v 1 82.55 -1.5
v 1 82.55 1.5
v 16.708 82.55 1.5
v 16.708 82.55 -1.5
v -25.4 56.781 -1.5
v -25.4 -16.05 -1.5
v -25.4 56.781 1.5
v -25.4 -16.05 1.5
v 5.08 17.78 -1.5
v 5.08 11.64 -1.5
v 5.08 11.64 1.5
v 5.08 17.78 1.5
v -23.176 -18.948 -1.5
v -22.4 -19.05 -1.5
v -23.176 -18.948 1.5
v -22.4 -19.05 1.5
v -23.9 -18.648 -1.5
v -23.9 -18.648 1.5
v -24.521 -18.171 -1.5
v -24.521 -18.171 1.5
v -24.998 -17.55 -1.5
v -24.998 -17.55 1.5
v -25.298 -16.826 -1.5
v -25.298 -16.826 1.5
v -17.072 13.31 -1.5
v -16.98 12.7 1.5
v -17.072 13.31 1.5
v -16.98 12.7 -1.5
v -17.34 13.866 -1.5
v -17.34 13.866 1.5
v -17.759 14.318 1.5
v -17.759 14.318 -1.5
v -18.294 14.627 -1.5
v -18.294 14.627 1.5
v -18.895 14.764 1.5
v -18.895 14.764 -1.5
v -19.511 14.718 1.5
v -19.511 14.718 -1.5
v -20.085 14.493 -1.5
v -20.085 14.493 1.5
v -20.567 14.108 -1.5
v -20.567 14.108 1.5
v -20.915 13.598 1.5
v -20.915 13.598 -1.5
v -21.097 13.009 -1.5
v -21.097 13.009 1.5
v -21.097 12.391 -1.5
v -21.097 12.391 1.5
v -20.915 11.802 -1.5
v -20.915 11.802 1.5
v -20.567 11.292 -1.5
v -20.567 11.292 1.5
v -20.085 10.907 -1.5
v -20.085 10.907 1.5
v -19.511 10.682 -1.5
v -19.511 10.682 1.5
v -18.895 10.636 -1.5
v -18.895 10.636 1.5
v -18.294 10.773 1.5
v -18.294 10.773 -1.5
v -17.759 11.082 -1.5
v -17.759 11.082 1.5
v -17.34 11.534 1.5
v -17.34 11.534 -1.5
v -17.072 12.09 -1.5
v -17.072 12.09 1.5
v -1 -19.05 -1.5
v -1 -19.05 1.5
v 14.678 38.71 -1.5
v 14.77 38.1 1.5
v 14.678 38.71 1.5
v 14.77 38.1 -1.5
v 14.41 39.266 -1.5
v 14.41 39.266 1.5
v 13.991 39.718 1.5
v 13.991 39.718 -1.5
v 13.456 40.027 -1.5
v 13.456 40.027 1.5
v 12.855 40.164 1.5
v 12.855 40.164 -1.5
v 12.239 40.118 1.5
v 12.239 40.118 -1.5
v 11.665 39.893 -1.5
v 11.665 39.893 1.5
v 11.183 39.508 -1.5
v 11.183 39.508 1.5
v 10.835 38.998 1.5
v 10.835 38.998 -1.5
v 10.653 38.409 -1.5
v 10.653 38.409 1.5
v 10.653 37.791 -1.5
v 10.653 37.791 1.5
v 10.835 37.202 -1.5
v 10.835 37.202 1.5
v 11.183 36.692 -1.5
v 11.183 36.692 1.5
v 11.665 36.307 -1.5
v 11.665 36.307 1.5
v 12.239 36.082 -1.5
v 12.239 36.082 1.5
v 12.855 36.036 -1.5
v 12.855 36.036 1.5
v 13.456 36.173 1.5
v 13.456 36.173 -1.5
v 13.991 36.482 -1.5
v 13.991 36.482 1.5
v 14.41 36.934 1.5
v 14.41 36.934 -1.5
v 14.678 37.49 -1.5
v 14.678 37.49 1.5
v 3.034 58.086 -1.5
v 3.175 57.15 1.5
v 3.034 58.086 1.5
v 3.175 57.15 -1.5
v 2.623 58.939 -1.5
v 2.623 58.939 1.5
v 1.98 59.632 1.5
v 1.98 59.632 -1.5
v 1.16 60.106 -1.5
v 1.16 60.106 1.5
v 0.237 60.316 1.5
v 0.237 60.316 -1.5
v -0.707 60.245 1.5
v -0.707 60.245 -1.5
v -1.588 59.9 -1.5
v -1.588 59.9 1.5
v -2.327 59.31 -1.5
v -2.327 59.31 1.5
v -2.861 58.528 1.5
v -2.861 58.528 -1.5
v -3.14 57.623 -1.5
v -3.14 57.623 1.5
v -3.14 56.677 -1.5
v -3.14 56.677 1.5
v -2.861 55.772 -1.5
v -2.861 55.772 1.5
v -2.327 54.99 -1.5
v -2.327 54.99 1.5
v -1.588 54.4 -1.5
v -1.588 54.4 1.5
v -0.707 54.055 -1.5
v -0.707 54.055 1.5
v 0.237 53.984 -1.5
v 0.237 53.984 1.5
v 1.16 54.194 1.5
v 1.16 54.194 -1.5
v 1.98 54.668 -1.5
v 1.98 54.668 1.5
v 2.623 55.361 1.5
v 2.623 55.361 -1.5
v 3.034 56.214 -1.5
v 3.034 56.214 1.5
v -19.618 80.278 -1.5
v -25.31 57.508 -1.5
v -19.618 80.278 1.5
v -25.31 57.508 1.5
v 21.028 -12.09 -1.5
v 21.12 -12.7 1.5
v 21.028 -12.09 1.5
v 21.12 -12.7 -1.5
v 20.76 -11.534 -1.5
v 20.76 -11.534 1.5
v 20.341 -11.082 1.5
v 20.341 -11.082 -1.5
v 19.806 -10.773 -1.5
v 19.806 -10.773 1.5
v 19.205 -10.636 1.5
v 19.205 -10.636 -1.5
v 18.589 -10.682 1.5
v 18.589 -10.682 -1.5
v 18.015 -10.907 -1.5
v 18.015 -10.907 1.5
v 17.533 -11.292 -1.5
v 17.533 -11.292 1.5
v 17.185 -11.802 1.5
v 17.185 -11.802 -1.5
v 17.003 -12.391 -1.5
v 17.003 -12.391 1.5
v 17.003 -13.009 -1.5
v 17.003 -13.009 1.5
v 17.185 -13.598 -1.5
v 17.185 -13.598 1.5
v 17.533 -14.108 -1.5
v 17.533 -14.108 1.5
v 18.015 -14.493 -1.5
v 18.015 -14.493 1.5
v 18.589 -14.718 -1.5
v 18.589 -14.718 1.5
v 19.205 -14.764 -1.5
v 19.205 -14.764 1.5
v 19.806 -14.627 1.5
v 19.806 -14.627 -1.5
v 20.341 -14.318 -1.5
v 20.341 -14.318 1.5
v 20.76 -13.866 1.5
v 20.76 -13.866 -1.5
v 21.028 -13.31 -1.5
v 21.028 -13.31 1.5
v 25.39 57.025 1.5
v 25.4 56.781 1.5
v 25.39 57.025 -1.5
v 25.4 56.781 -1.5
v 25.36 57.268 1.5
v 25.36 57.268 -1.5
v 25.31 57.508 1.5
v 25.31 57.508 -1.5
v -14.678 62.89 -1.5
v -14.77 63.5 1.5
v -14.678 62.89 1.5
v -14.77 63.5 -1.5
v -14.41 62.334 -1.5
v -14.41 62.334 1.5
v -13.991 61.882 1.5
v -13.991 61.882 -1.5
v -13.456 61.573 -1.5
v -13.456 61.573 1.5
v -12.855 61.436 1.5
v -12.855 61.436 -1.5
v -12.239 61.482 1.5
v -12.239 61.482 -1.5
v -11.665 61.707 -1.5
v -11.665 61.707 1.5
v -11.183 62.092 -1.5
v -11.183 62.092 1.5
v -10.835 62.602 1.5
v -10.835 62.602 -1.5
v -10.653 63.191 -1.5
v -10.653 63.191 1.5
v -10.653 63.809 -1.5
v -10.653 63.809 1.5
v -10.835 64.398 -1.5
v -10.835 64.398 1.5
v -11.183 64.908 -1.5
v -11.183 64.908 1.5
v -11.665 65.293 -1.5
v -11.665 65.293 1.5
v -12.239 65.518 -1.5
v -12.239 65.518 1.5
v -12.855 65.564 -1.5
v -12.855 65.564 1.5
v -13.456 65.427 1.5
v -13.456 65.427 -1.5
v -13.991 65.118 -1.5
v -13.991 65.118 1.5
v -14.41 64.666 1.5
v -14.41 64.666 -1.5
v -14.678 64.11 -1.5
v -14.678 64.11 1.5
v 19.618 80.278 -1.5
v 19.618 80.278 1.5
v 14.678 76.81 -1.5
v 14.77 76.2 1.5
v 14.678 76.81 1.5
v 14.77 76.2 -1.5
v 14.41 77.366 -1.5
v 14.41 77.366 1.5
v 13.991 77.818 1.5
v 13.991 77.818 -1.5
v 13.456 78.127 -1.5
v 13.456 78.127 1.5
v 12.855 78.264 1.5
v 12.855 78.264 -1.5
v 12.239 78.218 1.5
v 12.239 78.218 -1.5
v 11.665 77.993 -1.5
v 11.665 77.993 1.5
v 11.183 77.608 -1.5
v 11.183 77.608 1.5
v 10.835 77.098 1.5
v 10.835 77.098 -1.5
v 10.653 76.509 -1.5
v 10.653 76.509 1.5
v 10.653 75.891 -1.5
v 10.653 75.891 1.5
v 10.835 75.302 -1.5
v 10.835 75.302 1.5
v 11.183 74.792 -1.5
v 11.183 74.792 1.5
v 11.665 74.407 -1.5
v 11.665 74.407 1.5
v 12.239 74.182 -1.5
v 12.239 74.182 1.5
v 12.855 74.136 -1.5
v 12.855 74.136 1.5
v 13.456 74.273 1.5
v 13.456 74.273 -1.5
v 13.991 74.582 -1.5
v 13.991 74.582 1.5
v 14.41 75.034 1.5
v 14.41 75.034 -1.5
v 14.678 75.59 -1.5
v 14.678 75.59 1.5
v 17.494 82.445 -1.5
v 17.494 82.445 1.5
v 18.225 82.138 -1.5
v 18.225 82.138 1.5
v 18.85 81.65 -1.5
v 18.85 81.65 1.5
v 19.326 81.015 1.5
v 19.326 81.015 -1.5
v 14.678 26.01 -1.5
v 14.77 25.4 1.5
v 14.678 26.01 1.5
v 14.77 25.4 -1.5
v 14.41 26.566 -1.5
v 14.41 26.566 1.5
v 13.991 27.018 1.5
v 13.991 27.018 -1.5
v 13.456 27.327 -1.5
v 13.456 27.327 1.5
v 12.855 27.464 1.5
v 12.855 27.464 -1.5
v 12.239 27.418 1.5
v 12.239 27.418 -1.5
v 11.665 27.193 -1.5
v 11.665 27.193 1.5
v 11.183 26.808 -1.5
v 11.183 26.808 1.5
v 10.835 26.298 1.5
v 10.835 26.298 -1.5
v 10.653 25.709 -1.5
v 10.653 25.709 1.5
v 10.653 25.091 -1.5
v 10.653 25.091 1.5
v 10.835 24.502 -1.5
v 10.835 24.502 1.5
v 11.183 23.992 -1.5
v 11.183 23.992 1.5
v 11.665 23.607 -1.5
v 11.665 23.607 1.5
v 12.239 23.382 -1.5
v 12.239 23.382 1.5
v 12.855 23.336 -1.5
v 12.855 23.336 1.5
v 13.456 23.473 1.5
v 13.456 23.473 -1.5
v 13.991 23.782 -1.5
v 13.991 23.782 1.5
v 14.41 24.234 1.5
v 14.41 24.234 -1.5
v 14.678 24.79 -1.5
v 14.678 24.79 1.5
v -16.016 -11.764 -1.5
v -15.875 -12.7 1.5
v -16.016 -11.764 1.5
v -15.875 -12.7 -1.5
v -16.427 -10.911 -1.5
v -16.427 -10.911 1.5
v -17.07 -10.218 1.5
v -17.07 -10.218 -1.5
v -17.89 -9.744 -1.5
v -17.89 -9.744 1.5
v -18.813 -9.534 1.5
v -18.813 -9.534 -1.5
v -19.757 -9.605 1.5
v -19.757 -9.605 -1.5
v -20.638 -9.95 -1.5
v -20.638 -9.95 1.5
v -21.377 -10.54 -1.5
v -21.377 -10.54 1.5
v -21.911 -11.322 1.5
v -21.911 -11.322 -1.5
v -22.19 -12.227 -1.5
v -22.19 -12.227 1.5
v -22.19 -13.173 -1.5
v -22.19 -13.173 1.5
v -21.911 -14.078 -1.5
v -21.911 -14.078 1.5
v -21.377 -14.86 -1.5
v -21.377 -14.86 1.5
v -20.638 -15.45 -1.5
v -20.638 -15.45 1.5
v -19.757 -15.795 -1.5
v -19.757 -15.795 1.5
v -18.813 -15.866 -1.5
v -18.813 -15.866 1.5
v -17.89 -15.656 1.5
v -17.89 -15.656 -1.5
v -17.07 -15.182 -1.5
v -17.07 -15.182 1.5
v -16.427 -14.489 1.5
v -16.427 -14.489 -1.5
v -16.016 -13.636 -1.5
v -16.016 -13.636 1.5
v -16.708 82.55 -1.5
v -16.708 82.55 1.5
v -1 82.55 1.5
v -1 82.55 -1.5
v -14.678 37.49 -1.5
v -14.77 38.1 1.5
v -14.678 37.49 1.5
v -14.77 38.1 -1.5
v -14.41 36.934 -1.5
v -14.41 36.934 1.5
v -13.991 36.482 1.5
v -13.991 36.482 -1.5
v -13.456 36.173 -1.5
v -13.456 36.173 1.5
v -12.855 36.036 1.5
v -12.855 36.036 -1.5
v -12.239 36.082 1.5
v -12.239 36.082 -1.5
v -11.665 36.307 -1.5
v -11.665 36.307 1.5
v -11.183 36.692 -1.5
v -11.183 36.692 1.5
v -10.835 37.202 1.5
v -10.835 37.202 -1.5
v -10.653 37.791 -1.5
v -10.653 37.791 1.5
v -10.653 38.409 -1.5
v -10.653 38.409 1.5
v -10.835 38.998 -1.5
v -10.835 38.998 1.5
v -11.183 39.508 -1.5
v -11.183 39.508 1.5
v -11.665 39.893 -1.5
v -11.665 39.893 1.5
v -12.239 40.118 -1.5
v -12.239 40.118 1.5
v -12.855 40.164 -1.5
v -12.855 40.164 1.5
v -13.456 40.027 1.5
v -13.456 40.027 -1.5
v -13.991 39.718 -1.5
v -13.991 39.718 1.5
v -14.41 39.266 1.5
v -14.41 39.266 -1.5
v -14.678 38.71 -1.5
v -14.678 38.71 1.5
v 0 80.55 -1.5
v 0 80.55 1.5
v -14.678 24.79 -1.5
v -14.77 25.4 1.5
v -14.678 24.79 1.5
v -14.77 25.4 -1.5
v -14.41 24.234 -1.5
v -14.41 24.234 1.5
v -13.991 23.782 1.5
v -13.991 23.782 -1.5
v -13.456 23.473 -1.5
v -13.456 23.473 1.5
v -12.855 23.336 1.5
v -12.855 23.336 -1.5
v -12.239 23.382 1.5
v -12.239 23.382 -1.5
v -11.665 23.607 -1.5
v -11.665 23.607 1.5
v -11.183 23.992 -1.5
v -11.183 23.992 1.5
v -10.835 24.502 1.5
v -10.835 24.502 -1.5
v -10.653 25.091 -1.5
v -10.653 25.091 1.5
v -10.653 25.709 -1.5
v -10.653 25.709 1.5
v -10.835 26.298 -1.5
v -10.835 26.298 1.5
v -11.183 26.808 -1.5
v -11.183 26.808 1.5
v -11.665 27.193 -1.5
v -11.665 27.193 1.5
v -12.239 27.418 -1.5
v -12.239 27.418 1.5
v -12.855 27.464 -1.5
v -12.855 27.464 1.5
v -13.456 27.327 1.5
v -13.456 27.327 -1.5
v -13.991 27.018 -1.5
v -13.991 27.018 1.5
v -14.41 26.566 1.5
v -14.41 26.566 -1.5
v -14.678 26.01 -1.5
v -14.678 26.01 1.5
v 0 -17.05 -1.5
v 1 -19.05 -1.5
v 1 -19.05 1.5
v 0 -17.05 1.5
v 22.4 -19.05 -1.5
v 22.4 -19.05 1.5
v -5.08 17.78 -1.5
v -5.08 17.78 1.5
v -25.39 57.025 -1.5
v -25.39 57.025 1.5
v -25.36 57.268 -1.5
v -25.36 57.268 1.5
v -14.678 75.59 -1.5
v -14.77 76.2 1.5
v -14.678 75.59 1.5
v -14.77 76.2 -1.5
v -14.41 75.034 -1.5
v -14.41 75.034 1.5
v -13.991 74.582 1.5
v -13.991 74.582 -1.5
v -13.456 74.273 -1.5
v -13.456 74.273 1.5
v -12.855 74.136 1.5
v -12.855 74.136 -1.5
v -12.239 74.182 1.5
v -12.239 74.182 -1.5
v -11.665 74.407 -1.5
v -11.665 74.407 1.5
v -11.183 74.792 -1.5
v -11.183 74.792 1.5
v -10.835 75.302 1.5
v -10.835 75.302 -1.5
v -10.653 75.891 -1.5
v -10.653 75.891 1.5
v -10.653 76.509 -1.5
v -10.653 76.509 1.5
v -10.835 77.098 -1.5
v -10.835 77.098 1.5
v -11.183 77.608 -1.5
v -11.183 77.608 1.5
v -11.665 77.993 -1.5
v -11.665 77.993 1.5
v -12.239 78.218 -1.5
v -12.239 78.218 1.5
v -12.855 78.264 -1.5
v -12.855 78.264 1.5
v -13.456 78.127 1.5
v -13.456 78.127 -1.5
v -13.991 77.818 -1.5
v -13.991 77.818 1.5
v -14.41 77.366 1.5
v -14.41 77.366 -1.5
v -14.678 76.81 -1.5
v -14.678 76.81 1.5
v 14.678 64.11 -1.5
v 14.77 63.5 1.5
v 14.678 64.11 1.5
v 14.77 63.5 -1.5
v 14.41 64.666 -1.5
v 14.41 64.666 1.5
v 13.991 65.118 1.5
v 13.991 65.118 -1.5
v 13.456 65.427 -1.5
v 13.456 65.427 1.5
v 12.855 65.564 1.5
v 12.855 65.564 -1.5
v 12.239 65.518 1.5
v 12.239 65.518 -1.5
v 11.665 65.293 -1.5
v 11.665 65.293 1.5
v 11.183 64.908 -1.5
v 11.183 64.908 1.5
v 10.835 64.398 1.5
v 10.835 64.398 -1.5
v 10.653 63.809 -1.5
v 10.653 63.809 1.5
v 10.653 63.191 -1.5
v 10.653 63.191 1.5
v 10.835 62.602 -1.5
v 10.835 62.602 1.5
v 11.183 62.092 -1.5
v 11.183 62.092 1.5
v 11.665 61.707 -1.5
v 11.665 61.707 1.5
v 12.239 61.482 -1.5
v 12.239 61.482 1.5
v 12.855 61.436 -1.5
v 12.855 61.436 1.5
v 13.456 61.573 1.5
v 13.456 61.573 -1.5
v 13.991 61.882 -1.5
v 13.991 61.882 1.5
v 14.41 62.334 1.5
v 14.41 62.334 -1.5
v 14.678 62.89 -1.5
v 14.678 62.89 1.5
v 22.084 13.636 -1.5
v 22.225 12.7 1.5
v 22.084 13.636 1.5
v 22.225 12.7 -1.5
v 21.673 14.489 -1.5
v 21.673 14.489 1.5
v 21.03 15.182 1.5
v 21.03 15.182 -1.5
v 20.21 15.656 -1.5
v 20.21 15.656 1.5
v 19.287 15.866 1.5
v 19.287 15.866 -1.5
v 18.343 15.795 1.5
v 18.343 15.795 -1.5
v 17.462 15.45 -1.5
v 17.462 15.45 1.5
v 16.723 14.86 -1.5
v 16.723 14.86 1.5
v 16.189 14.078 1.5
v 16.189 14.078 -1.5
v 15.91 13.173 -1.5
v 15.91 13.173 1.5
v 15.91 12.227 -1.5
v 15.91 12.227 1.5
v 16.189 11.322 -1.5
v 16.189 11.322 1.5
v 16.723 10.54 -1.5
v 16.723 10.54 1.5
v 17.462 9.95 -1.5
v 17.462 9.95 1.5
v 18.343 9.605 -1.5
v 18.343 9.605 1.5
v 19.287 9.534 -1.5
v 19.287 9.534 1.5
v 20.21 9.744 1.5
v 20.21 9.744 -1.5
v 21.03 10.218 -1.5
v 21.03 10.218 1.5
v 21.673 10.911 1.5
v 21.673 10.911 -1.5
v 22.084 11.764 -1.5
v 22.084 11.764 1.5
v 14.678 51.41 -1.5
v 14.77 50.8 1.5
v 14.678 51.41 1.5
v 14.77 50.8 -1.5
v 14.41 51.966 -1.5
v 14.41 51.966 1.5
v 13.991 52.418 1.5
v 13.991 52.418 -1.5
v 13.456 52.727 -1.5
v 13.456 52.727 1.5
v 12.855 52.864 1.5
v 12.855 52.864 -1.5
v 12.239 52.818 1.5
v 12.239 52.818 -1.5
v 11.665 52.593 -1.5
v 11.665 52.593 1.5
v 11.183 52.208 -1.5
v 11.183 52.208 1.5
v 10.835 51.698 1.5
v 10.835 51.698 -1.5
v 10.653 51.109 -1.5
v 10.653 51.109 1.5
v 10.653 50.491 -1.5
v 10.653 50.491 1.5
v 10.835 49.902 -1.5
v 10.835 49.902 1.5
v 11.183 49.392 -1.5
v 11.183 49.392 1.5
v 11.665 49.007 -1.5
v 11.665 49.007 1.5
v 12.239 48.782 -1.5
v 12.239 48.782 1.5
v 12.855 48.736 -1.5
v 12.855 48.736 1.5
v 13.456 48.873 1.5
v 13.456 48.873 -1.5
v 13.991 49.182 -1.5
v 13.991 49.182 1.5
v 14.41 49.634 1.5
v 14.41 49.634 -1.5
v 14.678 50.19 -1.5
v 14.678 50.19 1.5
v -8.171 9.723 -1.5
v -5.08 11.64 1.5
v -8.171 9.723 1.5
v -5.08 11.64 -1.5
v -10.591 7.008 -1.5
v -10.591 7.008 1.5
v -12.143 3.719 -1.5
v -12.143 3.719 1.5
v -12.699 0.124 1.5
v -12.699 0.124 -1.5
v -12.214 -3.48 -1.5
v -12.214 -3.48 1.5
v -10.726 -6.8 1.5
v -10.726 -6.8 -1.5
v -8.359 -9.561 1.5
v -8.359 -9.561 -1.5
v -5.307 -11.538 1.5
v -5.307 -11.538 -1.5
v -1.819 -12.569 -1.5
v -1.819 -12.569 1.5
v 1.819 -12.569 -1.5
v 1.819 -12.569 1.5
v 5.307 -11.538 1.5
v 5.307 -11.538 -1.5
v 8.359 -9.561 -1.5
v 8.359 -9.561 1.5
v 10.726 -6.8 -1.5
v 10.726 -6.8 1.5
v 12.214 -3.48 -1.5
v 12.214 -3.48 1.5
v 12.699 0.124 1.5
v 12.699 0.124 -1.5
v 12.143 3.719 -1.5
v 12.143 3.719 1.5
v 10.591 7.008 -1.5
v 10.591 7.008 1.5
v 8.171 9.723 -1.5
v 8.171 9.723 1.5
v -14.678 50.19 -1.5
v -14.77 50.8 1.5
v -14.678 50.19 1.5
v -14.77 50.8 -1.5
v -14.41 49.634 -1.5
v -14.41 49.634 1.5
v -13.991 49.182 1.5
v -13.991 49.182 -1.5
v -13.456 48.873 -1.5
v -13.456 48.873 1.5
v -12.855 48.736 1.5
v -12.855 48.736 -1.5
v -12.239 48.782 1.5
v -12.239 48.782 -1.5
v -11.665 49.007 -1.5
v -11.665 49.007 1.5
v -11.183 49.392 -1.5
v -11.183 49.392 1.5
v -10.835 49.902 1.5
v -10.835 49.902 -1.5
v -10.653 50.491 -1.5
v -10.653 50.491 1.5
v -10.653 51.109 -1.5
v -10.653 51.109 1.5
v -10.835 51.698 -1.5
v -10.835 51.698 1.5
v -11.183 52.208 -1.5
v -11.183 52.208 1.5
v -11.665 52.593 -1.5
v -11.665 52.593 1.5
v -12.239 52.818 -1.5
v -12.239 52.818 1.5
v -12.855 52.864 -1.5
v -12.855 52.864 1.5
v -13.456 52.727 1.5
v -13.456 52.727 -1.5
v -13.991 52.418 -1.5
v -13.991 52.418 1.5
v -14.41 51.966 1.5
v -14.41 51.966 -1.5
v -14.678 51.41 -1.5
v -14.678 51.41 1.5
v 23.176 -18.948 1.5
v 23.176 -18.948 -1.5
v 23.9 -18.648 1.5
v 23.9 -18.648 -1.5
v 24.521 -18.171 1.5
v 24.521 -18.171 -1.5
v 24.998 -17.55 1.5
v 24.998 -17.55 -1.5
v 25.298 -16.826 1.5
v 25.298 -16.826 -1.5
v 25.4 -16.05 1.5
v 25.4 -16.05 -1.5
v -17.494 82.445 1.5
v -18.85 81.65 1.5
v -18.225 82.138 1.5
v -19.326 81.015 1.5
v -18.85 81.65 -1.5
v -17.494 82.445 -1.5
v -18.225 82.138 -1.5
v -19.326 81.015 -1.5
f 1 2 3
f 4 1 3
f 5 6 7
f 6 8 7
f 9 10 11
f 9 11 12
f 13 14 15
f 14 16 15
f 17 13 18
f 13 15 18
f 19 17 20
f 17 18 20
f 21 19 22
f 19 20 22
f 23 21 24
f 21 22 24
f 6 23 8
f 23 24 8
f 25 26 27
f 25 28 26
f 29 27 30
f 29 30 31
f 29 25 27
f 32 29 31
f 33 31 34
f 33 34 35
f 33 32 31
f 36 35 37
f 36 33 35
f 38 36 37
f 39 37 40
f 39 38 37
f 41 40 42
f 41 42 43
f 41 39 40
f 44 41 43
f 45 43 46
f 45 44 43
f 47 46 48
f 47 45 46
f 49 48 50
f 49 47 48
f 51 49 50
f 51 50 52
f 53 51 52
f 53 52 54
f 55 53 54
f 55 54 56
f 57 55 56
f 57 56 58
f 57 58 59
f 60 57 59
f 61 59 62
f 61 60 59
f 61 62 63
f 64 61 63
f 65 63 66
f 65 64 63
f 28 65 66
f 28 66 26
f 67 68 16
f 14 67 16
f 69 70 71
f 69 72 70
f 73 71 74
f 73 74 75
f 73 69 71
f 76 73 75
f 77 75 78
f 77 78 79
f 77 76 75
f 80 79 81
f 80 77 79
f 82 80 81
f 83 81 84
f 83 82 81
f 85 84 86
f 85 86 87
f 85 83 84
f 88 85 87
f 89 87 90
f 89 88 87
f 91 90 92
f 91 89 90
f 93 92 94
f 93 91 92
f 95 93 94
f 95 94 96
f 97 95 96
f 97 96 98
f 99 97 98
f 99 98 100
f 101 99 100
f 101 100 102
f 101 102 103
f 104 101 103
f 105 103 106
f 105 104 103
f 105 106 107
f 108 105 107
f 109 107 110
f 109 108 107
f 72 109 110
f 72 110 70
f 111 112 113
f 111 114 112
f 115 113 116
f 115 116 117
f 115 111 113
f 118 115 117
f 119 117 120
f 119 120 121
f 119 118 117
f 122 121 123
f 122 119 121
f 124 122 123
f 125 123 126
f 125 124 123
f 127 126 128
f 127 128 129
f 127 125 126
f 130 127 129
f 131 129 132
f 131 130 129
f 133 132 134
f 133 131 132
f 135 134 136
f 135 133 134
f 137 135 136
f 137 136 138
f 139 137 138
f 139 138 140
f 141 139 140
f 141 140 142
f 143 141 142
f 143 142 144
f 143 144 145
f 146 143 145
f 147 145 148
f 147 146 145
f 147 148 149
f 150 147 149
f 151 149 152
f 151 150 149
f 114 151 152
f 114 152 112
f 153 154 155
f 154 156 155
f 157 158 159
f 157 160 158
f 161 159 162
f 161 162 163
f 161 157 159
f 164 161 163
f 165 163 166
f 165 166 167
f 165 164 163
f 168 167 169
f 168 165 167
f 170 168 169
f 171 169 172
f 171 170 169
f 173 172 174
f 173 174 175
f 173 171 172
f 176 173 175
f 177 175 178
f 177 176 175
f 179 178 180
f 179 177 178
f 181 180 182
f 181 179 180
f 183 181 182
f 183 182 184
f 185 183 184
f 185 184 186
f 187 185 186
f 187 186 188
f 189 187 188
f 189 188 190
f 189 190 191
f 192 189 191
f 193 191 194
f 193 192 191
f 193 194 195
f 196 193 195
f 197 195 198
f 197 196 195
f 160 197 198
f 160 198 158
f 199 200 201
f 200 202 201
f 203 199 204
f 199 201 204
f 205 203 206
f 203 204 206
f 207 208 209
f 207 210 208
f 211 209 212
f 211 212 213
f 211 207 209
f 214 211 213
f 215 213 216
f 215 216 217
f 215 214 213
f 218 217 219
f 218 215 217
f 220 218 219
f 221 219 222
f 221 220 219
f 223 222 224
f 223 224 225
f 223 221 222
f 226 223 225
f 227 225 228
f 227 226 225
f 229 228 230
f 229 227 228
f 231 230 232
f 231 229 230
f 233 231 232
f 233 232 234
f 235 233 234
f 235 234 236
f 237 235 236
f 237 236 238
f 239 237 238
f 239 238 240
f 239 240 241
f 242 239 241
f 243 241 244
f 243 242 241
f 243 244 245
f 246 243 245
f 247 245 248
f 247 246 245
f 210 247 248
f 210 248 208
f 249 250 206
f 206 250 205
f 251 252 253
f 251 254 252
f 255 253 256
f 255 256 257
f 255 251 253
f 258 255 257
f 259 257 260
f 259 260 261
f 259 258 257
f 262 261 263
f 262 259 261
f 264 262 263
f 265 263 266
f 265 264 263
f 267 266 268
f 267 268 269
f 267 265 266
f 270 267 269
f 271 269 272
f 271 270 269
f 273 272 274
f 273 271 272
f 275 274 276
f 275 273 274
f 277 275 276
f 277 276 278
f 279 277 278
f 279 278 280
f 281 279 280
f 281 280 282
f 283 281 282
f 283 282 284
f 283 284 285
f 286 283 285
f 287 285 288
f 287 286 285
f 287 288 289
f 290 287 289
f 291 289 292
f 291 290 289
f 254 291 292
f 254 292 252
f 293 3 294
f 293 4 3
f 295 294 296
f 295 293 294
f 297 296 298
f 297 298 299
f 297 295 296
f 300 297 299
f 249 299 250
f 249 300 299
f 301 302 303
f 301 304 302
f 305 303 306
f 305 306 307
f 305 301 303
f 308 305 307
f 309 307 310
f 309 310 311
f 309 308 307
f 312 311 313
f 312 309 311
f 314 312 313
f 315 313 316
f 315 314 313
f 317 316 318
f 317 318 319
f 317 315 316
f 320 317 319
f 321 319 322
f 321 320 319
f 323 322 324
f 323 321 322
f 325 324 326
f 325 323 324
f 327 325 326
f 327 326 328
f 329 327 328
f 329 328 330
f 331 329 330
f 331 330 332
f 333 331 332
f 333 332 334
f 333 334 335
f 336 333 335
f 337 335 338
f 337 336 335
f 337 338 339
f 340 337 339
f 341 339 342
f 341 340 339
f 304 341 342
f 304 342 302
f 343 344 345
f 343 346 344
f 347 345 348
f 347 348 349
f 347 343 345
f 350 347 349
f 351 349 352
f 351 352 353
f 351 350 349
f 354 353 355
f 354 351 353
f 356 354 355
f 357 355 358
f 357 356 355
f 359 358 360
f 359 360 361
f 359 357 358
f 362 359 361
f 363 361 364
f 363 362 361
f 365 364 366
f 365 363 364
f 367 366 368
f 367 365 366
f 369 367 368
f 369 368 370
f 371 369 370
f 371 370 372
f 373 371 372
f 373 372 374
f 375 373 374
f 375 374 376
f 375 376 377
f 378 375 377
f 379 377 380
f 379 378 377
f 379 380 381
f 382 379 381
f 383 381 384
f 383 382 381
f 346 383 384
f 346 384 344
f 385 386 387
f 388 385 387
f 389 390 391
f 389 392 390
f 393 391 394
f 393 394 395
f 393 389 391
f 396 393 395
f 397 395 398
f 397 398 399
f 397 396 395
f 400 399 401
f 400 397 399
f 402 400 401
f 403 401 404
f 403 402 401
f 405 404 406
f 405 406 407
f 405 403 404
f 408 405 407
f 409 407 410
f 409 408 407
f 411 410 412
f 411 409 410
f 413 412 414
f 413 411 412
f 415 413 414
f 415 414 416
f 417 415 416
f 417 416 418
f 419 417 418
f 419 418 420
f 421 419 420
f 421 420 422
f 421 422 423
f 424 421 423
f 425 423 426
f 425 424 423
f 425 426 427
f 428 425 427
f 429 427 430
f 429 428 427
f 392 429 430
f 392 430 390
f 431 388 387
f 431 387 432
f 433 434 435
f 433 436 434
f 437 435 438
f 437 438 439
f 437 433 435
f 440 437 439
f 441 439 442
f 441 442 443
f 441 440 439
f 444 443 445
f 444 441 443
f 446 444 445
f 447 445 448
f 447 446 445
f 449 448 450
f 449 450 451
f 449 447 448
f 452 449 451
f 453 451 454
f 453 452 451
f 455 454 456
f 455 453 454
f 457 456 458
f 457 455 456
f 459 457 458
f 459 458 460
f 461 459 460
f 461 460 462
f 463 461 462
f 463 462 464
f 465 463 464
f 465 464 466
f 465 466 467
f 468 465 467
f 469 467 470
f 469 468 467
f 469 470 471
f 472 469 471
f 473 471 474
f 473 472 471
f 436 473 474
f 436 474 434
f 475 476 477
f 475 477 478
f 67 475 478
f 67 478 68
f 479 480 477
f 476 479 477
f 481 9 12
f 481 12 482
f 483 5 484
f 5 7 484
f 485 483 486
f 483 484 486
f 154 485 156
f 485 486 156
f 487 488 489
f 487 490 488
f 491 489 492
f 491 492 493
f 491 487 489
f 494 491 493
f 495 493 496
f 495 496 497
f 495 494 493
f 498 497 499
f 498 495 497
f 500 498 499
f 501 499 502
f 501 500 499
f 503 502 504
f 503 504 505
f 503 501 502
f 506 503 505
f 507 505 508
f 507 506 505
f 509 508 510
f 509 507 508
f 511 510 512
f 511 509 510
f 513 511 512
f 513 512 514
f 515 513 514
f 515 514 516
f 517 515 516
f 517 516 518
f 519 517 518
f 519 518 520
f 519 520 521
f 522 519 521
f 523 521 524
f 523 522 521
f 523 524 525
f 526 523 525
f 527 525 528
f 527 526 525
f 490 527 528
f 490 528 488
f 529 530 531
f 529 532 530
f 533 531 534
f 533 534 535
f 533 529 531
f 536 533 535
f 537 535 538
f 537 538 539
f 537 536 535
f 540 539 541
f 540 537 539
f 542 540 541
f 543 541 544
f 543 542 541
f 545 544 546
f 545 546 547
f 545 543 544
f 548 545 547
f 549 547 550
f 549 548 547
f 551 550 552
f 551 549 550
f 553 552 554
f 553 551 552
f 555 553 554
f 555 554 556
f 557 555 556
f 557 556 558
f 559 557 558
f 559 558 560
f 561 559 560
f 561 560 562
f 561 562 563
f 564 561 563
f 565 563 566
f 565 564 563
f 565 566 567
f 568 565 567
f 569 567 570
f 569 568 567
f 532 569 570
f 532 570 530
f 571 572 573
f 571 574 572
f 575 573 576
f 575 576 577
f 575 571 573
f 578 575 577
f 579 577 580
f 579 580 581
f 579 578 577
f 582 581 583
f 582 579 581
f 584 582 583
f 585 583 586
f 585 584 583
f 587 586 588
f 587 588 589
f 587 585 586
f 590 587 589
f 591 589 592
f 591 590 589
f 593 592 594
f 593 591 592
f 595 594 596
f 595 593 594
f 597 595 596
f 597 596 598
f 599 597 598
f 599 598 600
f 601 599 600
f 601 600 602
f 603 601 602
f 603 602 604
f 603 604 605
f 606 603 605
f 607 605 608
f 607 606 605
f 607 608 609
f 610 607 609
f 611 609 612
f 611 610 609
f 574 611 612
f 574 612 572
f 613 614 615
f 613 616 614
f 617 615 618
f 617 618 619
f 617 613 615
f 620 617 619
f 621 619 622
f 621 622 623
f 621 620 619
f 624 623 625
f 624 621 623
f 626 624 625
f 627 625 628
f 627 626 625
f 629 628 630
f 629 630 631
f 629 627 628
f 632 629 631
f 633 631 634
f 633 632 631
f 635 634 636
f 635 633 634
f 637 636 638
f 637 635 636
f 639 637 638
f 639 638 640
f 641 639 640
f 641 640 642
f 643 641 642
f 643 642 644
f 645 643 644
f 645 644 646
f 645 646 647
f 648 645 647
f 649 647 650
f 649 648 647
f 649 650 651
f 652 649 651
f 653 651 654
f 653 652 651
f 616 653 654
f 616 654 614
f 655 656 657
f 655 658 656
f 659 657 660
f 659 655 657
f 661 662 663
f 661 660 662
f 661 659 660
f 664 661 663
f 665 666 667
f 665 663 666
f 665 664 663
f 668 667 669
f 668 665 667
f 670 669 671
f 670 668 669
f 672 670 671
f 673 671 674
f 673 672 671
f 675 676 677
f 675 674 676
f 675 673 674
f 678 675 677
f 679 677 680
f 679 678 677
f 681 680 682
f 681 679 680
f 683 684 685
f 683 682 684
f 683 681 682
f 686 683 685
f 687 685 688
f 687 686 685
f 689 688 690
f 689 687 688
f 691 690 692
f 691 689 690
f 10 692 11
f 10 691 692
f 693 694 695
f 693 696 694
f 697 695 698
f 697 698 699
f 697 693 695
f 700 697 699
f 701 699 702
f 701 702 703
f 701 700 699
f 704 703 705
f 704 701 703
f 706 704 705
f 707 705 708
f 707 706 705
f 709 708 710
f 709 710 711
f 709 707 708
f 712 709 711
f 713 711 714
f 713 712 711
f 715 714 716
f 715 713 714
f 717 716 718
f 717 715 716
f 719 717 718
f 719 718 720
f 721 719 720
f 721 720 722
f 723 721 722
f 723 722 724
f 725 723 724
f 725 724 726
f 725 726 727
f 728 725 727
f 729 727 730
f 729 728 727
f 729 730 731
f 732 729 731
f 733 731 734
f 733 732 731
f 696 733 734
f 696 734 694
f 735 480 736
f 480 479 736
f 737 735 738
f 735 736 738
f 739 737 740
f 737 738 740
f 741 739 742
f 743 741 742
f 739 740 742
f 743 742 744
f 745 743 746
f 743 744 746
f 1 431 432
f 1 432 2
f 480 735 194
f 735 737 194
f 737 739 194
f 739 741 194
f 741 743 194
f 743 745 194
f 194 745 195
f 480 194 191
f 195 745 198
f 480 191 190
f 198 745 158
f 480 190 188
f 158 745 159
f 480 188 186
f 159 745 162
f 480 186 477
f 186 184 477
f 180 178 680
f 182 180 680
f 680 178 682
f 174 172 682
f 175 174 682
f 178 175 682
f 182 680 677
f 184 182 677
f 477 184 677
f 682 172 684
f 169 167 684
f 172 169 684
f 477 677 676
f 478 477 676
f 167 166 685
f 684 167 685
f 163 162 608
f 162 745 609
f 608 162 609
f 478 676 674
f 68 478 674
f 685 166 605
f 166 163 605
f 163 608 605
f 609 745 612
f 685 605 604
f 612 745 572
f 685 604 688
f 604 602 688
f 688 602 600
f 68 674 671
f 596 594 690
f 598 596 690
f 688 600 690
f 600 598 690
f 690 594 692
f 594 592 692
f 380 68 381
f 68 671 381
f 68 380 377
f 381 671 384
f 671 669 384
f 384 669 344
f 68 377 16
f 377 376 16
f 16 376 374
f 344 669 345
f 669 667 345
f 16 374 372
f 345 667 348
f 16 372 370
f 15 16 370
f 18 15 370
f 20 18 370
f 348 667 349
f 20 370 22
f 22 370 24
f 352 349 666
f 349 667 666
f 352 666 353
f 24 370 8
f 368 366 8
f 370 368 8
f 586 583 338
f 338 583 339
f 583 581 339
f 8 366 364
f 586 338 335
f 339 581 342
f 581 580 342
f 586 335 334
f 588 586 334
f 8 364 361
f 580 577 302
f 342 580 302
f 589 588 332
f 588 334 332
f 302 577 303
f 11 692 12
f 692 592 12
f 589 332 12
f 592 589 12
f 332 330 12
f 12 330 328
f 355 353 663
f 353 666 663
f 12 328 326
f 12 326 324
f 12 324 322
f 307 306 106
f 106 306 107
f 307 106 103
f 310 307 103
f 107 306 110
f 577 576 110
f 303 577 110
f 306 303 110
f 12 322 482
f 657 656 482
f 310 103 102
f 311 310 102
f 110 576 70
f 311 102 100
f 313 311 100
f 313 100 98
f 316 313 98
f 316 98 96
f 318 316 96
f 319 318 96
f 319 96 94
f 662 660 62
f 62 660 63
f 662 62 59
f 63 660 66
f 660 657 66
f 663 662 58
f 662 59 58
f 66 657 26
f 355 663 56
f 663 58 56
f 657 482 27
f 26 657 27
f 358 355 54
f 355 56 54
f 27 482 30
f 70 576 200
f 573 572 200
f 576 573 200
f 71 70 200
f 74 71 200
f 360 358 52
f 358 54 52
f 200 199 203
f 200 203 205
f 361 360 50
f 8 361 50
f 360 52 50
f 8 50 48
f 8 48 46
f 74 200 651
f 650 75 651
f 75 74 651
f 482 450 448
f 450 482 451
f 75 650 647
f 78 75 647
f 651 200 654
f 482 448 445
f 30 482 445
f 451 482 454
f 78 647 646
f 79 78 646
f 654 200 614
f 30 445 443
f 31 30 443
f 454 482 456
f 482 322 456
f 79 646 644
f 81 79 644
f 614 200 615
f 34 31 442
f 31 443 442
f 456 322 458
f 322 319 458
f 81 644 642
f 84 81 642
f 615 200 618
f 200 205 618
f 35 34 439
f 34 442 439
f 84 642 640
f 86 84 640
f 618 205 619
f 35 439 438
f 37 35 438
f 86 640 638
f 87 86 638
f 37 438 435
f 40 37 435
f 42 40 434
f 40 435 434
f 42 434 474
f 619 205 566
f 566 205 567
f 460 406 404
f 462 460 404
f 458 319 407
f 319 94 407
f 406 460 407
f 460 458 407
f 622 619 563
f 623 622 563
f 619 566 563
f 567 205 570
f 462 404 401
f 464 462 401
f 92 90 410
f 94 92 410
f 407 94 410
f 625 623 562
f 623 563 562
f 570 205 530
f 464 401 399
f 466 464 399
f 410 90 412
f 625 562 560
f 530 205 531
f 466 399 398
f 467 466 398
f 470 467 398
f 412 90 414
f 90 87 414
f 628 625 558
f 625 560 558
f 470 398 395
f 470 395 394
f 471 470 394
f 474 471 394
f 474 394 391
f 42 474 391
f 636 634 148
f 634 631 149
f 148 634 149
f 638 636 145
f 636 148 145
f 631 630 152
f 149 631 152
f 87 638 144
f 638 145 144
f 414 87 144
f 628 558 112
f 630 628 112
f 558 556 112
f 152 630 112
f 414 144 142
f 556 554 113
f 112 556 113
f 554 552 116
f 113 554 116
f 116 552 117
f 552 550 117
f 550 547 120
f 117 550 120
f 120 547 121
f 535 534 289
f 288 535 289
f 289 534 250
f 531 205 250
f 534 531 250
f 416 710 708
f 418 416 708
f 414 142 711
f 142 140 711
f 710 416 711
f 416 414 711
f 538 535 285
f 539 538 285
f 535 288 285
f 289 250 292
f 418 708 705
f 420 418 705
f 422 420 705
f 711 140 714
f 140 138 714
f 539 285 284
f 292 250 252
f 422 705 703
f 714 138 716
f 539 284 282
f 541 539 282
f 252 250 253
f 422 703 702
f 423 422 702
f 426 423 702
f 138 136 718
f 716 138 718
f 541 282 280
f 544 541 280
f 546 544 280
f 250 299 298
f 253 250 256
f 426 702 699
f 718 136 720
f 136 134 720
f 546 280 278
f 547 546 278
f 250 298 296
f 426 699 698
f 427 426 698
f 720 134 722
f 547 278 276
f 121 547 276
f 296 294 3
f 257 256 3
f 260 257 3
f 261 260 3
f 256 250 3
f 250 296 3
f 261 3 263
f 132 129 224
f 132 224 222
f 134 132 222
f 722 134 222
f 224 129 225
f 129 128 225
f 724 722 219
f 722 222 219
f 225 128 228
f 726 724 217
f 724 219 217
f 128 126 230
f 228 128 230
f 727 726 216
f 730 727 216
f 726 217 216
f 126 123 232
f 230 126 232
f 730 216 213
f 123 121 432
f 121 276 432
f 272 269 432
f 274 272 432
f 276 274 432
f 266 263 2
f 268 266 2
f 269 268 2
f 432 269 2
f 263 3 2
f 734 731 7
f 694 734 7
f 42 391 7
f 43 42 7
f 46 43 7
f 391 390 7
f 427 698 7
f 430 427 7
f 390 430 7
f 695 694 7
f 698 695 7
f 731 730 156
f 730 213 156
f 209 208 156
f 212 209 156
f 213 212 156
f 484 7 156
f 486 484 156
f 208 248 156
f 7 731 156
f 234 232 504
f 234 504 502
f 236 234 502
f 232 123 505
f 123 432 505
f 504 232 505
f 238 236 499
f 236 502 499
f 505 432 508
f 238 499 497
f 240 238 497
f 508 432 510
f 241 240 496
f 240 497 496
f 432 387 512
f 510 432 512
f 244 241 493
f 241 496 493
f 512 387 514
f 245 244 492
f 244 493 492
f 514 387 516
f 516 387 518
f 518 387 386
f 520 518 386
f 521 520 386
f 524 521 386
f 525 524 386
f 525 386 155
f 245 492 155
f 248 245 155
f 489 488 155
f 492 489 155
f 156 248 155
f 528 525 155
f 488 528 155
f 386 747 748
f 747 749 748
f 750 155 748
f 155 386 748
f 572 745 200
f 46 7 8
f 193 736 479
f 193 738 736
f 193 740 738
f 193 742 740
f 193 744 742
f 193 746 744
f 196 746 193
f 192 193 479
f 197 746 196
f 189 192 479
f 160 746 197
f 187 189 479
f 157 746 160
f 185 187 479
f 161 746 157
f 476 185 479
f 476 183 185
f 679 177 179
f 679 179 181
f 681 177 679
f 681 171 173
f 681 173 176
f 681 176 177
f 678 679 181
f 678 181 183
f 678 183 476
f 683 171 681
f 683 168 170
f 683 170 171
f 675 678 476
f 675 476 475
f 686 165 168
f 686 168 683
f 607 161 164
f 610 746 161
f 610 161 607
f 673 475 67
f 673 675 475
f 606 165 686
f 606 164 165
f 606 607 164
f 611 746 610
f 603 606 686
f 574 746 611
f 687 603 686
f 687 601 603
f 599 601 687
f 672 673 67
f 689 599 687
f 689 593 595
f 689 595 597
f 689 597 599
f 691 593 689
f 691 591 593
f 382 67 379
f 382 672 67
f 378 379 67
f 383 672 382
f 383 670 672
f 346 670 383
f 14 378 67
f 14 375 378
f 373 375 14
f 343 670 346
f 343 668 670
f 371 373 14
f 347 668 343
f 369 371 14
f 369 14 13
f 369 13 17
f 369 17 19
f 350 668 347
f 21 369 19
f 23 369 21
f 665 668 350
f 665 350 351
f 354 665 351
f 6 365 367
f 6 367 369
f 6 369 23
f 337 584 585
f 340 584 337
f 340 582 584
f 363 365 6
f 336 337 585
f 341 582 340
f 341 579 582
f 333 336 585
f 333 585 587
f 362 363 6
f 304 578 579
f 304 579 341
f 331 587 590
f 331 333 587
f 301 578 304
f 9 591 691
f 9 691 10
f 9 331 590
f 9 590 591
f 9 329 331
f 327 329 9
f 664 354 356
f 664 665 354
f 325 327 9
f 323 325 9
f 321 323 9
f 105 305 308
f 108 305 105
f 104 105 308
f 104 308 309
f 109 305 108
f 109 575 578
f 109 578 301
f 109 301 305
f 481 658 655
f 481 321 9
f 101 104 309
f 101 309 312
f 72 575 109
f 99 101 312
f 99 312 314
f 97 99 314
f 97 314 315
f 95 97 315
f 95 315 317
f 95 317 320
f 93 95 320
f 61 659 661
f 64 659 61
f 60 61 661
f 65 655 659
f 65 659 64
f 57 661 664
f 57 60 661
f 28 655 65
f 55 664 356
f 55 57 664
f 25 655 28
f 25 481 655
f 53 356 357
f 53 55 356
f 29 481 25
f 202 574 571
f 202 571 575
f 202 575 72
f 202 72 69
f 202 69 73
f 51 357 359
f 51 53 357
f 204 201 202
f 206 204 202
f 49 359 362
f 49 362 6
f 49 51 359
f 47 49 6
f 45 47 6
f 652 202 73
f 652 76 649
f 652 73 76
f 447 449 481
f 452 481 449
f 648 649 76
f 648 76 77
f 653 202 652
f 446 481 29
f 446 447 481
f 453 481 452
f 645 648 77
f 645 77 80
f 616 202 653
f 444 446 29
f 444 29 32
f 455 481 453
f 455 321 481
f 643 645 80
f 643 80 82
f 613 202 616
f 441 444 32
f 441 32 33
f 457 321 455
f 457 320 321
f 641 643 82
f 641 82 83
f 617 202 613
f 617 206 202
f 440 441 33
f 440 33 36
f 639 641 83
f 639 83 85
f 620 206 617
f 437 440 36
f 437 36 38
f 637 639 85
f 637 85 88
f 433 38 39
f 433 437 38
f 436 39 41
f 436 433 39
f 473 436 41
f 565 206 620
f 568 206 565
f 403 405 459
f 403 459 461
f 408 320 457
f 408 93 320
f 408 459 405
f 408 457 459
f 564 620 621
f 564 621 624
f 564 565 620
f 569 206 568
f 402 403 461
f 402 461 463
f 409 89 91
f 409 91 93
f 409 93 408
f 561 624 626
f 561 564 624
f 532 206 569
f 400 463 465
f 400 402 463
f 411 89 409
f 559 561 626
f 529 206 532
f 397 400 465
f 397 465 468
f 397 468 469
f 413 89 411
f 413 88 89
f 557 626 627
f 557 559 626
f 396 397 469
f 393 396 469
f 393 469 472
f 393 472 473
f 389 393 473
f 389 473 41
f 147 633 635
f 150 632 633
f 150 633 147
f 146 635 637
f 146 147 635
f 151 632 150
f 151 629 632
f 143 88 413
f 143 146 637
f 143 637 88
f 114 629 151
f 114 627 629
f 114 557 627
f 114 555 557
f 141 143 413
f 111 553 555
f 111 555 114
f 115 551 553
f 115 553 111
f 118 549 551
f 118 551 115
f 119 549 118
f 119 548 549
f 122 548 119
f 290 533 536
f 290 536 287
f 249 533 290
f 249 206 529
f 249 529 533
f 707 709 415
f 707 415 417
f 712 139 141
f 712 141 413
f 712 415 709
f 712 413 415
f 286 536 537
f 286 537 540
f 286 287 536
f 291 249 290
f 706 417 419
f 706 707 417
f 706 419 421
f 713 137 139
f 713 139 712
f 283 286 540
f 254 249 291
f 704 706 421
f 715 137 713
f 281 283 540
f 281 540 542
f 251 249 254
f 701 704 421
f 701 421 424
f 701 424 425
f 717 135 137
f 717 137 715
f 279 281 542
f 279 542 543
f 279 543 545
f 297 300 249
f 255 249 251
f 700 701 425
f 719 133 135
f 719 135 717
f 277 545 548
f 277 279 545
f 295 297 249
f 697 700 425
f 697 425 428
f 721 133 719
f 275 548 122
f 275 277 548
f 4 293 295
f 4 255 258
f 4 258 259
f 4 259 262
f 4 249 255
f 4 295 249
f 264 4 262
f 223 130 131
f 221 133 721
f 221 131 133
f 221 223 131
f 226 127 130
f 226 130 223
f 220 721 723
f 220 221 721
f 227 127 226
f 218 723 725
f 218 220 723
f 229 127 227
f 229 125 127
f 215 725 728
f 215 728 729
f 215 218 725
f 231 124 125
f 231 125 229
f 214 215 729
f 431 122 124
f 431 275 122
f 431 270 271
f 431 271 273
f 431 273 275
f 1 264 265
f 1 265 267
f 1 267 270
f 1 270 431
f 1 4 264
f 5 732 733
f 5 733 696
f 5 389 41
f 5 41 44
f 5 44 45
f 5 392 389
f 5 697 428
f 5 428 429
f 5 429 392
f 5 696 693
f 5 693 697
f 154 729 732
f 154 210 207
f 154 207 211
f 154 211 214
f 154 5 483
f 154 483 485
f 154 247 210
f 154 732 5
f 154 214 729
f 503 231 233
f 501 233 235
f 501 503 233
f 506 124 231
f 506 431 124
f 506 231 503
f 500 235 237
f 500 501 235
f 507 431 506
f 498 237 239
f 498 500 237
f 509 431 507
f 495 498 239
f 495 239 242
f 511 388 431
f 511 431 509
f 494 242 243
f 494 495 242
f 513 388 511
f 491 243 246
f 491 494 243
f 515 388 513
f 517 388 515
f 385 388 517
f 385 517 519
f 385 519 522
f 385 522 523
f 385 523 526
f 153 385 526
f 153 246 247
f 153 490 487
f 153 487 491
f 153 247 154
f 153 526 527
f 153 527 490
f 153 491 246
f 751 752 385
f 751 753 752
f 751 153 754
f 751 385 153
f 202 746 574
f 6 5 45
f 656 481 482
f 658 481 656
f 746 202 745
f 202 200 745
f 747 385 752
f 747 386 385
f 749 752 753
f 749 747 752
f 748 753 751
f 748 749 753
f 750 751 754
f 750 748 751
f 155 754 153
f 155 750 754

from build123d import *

# Parameters (mm, degrees)
SKETCH1_R           = 12.7
SKETCH1_R_2         = 3.175
SKETCH1_R_3         = 2.07
BOSS_EXTRUDE1_DEPTH = 1.5
FILLET1_R           = 3.000000096
CUT_EXTRUDE1_START  = -3
CUT_EXTRUDE1_DEPTH  = 3


with BuildPart() as part:
    # Sketch1 → Boss-Extrude1 (new, symmetric)
    with BuildSketch(Plane.XY):
        Polygon((-19.05, 82.55), (19.05, 82.55), (25.4, 57.15), (25.4, -19.05), (-25.4, -19.05), (-25.4, 57.15), align=None)
        Circle(SKETCH1_R, mode=Mode.SUBTRACT)
        with Locations((-19.05, -12.7)):
            Circle(SKETCH1_R_2, mode=Mode.SUBTRACT)
        with Locations((19.05, 12.7)):
            Circle(SKETCH1_R_2, mode=Mode.SUBTRACT)
        with Locations((-19.05, 12.7)):
            Circle(SKETCH1_R_3, mode=Mode.SUBTRACT)
        with Locations((19.05, -12.7)):
            Circle(SKETCH1_R_3, mode=Mode.SUBTRACT)
        with Locations((0, 57.15)):
            Circle(SKETCH1_R_2, mode=Mode.SUBTRACT)
        with Locations((12.7, 25.4)):
            Circle(SKETCH1_R_3, mode=Mode.SUBTRACT)
        with Locations((12.7, 38.1)):
            Circle(SKETCH1_R_3, mode=Mode.SUBTRACT)
        with Locations((12.7, 50.8)):
            Circle(SKETCH1_R_3, mode=Mode.SUBTRACT)
        with Locations((12.7, 63.5)):
            Circle(SKETCH1_R_3, mode=Mode.SUBTRACT)
        with Locations((12.7, 76.2)):
            Circle(SKETCH1_R_3, mode=Mode.SUBTRACT)
        with Locations(Location((-12.7, 25.4, 0), (0, 0, 180))):
            Circle(SKETCH1_R_3, mode=Mode.SUBTRACT)
        with Locations(Location((-12.7, 38.1, 0), (0, 0, 180))):
            Circle(SKETCH1_R_3, mode=Mode.SUBTRACT)
        with Locations(Location((-12.7, 50.8, 0), (0, 0, 180))):
            Circle(SKETCH1_R_3, mode=Mode.SUBTRACT)
        with Locations(Location((-12.7, 63.5, 0), (0, 0, 180))):
            Circle(SKETCH1_R_3, mode=Mode.SUBTRACT)
        with Locations(Location((-12.7, 76.2, 0), (0, 0, 180))):
            Circle(SKETCH1_R_3, mode=Mode.SUBTRACT)
    extrude(amount=BOSS_EXTRUDE1_DEPTH, both=True)

    # Fillet1
    fillet1_edges = [part.edges().sort_by_distance(p)[0] for p in [
        (-19.05, 82.55, 0),
        (19.05, 82.55, 0),
        (25.4, 57.15, 0),
        (25.4, -19.05, 0),
        (-25.4, -19.05, 0),
        (-25.4, 57.15, 0),
    ]]
    fillet(fillet1_edges, radius=FILLET1_R)

    # Sketch2 → Cut-Extrude1 (cut)
    with BuildSketch(Plane.XY.offset(1.5).offset(CUT_EXTRUDE1_START)):
        with BuildLine():
            Line((5.08, 17.78), (-5.08, 17.78))
            Line((-5.08, 17.78), (-5.08, 11.639742265))
            ThreePointArc((-5.08, 11.639742265), (0, 12.7), (5.08, 11.639742265))
            Line((5.08, 11.639742265), (5.08, 17.78))
        make_face()
        Polygon((0, -17.05), (-1, -19.05), (1, -19.05), align=None)
        Polygon((1, 82.55), (-1, 82.55), (0, 80.55), align=None)
    extrude(amount=CUT_EXTRUDE1_DEPTH, mode=Mode.SUBTRACT)


solid = part.part
